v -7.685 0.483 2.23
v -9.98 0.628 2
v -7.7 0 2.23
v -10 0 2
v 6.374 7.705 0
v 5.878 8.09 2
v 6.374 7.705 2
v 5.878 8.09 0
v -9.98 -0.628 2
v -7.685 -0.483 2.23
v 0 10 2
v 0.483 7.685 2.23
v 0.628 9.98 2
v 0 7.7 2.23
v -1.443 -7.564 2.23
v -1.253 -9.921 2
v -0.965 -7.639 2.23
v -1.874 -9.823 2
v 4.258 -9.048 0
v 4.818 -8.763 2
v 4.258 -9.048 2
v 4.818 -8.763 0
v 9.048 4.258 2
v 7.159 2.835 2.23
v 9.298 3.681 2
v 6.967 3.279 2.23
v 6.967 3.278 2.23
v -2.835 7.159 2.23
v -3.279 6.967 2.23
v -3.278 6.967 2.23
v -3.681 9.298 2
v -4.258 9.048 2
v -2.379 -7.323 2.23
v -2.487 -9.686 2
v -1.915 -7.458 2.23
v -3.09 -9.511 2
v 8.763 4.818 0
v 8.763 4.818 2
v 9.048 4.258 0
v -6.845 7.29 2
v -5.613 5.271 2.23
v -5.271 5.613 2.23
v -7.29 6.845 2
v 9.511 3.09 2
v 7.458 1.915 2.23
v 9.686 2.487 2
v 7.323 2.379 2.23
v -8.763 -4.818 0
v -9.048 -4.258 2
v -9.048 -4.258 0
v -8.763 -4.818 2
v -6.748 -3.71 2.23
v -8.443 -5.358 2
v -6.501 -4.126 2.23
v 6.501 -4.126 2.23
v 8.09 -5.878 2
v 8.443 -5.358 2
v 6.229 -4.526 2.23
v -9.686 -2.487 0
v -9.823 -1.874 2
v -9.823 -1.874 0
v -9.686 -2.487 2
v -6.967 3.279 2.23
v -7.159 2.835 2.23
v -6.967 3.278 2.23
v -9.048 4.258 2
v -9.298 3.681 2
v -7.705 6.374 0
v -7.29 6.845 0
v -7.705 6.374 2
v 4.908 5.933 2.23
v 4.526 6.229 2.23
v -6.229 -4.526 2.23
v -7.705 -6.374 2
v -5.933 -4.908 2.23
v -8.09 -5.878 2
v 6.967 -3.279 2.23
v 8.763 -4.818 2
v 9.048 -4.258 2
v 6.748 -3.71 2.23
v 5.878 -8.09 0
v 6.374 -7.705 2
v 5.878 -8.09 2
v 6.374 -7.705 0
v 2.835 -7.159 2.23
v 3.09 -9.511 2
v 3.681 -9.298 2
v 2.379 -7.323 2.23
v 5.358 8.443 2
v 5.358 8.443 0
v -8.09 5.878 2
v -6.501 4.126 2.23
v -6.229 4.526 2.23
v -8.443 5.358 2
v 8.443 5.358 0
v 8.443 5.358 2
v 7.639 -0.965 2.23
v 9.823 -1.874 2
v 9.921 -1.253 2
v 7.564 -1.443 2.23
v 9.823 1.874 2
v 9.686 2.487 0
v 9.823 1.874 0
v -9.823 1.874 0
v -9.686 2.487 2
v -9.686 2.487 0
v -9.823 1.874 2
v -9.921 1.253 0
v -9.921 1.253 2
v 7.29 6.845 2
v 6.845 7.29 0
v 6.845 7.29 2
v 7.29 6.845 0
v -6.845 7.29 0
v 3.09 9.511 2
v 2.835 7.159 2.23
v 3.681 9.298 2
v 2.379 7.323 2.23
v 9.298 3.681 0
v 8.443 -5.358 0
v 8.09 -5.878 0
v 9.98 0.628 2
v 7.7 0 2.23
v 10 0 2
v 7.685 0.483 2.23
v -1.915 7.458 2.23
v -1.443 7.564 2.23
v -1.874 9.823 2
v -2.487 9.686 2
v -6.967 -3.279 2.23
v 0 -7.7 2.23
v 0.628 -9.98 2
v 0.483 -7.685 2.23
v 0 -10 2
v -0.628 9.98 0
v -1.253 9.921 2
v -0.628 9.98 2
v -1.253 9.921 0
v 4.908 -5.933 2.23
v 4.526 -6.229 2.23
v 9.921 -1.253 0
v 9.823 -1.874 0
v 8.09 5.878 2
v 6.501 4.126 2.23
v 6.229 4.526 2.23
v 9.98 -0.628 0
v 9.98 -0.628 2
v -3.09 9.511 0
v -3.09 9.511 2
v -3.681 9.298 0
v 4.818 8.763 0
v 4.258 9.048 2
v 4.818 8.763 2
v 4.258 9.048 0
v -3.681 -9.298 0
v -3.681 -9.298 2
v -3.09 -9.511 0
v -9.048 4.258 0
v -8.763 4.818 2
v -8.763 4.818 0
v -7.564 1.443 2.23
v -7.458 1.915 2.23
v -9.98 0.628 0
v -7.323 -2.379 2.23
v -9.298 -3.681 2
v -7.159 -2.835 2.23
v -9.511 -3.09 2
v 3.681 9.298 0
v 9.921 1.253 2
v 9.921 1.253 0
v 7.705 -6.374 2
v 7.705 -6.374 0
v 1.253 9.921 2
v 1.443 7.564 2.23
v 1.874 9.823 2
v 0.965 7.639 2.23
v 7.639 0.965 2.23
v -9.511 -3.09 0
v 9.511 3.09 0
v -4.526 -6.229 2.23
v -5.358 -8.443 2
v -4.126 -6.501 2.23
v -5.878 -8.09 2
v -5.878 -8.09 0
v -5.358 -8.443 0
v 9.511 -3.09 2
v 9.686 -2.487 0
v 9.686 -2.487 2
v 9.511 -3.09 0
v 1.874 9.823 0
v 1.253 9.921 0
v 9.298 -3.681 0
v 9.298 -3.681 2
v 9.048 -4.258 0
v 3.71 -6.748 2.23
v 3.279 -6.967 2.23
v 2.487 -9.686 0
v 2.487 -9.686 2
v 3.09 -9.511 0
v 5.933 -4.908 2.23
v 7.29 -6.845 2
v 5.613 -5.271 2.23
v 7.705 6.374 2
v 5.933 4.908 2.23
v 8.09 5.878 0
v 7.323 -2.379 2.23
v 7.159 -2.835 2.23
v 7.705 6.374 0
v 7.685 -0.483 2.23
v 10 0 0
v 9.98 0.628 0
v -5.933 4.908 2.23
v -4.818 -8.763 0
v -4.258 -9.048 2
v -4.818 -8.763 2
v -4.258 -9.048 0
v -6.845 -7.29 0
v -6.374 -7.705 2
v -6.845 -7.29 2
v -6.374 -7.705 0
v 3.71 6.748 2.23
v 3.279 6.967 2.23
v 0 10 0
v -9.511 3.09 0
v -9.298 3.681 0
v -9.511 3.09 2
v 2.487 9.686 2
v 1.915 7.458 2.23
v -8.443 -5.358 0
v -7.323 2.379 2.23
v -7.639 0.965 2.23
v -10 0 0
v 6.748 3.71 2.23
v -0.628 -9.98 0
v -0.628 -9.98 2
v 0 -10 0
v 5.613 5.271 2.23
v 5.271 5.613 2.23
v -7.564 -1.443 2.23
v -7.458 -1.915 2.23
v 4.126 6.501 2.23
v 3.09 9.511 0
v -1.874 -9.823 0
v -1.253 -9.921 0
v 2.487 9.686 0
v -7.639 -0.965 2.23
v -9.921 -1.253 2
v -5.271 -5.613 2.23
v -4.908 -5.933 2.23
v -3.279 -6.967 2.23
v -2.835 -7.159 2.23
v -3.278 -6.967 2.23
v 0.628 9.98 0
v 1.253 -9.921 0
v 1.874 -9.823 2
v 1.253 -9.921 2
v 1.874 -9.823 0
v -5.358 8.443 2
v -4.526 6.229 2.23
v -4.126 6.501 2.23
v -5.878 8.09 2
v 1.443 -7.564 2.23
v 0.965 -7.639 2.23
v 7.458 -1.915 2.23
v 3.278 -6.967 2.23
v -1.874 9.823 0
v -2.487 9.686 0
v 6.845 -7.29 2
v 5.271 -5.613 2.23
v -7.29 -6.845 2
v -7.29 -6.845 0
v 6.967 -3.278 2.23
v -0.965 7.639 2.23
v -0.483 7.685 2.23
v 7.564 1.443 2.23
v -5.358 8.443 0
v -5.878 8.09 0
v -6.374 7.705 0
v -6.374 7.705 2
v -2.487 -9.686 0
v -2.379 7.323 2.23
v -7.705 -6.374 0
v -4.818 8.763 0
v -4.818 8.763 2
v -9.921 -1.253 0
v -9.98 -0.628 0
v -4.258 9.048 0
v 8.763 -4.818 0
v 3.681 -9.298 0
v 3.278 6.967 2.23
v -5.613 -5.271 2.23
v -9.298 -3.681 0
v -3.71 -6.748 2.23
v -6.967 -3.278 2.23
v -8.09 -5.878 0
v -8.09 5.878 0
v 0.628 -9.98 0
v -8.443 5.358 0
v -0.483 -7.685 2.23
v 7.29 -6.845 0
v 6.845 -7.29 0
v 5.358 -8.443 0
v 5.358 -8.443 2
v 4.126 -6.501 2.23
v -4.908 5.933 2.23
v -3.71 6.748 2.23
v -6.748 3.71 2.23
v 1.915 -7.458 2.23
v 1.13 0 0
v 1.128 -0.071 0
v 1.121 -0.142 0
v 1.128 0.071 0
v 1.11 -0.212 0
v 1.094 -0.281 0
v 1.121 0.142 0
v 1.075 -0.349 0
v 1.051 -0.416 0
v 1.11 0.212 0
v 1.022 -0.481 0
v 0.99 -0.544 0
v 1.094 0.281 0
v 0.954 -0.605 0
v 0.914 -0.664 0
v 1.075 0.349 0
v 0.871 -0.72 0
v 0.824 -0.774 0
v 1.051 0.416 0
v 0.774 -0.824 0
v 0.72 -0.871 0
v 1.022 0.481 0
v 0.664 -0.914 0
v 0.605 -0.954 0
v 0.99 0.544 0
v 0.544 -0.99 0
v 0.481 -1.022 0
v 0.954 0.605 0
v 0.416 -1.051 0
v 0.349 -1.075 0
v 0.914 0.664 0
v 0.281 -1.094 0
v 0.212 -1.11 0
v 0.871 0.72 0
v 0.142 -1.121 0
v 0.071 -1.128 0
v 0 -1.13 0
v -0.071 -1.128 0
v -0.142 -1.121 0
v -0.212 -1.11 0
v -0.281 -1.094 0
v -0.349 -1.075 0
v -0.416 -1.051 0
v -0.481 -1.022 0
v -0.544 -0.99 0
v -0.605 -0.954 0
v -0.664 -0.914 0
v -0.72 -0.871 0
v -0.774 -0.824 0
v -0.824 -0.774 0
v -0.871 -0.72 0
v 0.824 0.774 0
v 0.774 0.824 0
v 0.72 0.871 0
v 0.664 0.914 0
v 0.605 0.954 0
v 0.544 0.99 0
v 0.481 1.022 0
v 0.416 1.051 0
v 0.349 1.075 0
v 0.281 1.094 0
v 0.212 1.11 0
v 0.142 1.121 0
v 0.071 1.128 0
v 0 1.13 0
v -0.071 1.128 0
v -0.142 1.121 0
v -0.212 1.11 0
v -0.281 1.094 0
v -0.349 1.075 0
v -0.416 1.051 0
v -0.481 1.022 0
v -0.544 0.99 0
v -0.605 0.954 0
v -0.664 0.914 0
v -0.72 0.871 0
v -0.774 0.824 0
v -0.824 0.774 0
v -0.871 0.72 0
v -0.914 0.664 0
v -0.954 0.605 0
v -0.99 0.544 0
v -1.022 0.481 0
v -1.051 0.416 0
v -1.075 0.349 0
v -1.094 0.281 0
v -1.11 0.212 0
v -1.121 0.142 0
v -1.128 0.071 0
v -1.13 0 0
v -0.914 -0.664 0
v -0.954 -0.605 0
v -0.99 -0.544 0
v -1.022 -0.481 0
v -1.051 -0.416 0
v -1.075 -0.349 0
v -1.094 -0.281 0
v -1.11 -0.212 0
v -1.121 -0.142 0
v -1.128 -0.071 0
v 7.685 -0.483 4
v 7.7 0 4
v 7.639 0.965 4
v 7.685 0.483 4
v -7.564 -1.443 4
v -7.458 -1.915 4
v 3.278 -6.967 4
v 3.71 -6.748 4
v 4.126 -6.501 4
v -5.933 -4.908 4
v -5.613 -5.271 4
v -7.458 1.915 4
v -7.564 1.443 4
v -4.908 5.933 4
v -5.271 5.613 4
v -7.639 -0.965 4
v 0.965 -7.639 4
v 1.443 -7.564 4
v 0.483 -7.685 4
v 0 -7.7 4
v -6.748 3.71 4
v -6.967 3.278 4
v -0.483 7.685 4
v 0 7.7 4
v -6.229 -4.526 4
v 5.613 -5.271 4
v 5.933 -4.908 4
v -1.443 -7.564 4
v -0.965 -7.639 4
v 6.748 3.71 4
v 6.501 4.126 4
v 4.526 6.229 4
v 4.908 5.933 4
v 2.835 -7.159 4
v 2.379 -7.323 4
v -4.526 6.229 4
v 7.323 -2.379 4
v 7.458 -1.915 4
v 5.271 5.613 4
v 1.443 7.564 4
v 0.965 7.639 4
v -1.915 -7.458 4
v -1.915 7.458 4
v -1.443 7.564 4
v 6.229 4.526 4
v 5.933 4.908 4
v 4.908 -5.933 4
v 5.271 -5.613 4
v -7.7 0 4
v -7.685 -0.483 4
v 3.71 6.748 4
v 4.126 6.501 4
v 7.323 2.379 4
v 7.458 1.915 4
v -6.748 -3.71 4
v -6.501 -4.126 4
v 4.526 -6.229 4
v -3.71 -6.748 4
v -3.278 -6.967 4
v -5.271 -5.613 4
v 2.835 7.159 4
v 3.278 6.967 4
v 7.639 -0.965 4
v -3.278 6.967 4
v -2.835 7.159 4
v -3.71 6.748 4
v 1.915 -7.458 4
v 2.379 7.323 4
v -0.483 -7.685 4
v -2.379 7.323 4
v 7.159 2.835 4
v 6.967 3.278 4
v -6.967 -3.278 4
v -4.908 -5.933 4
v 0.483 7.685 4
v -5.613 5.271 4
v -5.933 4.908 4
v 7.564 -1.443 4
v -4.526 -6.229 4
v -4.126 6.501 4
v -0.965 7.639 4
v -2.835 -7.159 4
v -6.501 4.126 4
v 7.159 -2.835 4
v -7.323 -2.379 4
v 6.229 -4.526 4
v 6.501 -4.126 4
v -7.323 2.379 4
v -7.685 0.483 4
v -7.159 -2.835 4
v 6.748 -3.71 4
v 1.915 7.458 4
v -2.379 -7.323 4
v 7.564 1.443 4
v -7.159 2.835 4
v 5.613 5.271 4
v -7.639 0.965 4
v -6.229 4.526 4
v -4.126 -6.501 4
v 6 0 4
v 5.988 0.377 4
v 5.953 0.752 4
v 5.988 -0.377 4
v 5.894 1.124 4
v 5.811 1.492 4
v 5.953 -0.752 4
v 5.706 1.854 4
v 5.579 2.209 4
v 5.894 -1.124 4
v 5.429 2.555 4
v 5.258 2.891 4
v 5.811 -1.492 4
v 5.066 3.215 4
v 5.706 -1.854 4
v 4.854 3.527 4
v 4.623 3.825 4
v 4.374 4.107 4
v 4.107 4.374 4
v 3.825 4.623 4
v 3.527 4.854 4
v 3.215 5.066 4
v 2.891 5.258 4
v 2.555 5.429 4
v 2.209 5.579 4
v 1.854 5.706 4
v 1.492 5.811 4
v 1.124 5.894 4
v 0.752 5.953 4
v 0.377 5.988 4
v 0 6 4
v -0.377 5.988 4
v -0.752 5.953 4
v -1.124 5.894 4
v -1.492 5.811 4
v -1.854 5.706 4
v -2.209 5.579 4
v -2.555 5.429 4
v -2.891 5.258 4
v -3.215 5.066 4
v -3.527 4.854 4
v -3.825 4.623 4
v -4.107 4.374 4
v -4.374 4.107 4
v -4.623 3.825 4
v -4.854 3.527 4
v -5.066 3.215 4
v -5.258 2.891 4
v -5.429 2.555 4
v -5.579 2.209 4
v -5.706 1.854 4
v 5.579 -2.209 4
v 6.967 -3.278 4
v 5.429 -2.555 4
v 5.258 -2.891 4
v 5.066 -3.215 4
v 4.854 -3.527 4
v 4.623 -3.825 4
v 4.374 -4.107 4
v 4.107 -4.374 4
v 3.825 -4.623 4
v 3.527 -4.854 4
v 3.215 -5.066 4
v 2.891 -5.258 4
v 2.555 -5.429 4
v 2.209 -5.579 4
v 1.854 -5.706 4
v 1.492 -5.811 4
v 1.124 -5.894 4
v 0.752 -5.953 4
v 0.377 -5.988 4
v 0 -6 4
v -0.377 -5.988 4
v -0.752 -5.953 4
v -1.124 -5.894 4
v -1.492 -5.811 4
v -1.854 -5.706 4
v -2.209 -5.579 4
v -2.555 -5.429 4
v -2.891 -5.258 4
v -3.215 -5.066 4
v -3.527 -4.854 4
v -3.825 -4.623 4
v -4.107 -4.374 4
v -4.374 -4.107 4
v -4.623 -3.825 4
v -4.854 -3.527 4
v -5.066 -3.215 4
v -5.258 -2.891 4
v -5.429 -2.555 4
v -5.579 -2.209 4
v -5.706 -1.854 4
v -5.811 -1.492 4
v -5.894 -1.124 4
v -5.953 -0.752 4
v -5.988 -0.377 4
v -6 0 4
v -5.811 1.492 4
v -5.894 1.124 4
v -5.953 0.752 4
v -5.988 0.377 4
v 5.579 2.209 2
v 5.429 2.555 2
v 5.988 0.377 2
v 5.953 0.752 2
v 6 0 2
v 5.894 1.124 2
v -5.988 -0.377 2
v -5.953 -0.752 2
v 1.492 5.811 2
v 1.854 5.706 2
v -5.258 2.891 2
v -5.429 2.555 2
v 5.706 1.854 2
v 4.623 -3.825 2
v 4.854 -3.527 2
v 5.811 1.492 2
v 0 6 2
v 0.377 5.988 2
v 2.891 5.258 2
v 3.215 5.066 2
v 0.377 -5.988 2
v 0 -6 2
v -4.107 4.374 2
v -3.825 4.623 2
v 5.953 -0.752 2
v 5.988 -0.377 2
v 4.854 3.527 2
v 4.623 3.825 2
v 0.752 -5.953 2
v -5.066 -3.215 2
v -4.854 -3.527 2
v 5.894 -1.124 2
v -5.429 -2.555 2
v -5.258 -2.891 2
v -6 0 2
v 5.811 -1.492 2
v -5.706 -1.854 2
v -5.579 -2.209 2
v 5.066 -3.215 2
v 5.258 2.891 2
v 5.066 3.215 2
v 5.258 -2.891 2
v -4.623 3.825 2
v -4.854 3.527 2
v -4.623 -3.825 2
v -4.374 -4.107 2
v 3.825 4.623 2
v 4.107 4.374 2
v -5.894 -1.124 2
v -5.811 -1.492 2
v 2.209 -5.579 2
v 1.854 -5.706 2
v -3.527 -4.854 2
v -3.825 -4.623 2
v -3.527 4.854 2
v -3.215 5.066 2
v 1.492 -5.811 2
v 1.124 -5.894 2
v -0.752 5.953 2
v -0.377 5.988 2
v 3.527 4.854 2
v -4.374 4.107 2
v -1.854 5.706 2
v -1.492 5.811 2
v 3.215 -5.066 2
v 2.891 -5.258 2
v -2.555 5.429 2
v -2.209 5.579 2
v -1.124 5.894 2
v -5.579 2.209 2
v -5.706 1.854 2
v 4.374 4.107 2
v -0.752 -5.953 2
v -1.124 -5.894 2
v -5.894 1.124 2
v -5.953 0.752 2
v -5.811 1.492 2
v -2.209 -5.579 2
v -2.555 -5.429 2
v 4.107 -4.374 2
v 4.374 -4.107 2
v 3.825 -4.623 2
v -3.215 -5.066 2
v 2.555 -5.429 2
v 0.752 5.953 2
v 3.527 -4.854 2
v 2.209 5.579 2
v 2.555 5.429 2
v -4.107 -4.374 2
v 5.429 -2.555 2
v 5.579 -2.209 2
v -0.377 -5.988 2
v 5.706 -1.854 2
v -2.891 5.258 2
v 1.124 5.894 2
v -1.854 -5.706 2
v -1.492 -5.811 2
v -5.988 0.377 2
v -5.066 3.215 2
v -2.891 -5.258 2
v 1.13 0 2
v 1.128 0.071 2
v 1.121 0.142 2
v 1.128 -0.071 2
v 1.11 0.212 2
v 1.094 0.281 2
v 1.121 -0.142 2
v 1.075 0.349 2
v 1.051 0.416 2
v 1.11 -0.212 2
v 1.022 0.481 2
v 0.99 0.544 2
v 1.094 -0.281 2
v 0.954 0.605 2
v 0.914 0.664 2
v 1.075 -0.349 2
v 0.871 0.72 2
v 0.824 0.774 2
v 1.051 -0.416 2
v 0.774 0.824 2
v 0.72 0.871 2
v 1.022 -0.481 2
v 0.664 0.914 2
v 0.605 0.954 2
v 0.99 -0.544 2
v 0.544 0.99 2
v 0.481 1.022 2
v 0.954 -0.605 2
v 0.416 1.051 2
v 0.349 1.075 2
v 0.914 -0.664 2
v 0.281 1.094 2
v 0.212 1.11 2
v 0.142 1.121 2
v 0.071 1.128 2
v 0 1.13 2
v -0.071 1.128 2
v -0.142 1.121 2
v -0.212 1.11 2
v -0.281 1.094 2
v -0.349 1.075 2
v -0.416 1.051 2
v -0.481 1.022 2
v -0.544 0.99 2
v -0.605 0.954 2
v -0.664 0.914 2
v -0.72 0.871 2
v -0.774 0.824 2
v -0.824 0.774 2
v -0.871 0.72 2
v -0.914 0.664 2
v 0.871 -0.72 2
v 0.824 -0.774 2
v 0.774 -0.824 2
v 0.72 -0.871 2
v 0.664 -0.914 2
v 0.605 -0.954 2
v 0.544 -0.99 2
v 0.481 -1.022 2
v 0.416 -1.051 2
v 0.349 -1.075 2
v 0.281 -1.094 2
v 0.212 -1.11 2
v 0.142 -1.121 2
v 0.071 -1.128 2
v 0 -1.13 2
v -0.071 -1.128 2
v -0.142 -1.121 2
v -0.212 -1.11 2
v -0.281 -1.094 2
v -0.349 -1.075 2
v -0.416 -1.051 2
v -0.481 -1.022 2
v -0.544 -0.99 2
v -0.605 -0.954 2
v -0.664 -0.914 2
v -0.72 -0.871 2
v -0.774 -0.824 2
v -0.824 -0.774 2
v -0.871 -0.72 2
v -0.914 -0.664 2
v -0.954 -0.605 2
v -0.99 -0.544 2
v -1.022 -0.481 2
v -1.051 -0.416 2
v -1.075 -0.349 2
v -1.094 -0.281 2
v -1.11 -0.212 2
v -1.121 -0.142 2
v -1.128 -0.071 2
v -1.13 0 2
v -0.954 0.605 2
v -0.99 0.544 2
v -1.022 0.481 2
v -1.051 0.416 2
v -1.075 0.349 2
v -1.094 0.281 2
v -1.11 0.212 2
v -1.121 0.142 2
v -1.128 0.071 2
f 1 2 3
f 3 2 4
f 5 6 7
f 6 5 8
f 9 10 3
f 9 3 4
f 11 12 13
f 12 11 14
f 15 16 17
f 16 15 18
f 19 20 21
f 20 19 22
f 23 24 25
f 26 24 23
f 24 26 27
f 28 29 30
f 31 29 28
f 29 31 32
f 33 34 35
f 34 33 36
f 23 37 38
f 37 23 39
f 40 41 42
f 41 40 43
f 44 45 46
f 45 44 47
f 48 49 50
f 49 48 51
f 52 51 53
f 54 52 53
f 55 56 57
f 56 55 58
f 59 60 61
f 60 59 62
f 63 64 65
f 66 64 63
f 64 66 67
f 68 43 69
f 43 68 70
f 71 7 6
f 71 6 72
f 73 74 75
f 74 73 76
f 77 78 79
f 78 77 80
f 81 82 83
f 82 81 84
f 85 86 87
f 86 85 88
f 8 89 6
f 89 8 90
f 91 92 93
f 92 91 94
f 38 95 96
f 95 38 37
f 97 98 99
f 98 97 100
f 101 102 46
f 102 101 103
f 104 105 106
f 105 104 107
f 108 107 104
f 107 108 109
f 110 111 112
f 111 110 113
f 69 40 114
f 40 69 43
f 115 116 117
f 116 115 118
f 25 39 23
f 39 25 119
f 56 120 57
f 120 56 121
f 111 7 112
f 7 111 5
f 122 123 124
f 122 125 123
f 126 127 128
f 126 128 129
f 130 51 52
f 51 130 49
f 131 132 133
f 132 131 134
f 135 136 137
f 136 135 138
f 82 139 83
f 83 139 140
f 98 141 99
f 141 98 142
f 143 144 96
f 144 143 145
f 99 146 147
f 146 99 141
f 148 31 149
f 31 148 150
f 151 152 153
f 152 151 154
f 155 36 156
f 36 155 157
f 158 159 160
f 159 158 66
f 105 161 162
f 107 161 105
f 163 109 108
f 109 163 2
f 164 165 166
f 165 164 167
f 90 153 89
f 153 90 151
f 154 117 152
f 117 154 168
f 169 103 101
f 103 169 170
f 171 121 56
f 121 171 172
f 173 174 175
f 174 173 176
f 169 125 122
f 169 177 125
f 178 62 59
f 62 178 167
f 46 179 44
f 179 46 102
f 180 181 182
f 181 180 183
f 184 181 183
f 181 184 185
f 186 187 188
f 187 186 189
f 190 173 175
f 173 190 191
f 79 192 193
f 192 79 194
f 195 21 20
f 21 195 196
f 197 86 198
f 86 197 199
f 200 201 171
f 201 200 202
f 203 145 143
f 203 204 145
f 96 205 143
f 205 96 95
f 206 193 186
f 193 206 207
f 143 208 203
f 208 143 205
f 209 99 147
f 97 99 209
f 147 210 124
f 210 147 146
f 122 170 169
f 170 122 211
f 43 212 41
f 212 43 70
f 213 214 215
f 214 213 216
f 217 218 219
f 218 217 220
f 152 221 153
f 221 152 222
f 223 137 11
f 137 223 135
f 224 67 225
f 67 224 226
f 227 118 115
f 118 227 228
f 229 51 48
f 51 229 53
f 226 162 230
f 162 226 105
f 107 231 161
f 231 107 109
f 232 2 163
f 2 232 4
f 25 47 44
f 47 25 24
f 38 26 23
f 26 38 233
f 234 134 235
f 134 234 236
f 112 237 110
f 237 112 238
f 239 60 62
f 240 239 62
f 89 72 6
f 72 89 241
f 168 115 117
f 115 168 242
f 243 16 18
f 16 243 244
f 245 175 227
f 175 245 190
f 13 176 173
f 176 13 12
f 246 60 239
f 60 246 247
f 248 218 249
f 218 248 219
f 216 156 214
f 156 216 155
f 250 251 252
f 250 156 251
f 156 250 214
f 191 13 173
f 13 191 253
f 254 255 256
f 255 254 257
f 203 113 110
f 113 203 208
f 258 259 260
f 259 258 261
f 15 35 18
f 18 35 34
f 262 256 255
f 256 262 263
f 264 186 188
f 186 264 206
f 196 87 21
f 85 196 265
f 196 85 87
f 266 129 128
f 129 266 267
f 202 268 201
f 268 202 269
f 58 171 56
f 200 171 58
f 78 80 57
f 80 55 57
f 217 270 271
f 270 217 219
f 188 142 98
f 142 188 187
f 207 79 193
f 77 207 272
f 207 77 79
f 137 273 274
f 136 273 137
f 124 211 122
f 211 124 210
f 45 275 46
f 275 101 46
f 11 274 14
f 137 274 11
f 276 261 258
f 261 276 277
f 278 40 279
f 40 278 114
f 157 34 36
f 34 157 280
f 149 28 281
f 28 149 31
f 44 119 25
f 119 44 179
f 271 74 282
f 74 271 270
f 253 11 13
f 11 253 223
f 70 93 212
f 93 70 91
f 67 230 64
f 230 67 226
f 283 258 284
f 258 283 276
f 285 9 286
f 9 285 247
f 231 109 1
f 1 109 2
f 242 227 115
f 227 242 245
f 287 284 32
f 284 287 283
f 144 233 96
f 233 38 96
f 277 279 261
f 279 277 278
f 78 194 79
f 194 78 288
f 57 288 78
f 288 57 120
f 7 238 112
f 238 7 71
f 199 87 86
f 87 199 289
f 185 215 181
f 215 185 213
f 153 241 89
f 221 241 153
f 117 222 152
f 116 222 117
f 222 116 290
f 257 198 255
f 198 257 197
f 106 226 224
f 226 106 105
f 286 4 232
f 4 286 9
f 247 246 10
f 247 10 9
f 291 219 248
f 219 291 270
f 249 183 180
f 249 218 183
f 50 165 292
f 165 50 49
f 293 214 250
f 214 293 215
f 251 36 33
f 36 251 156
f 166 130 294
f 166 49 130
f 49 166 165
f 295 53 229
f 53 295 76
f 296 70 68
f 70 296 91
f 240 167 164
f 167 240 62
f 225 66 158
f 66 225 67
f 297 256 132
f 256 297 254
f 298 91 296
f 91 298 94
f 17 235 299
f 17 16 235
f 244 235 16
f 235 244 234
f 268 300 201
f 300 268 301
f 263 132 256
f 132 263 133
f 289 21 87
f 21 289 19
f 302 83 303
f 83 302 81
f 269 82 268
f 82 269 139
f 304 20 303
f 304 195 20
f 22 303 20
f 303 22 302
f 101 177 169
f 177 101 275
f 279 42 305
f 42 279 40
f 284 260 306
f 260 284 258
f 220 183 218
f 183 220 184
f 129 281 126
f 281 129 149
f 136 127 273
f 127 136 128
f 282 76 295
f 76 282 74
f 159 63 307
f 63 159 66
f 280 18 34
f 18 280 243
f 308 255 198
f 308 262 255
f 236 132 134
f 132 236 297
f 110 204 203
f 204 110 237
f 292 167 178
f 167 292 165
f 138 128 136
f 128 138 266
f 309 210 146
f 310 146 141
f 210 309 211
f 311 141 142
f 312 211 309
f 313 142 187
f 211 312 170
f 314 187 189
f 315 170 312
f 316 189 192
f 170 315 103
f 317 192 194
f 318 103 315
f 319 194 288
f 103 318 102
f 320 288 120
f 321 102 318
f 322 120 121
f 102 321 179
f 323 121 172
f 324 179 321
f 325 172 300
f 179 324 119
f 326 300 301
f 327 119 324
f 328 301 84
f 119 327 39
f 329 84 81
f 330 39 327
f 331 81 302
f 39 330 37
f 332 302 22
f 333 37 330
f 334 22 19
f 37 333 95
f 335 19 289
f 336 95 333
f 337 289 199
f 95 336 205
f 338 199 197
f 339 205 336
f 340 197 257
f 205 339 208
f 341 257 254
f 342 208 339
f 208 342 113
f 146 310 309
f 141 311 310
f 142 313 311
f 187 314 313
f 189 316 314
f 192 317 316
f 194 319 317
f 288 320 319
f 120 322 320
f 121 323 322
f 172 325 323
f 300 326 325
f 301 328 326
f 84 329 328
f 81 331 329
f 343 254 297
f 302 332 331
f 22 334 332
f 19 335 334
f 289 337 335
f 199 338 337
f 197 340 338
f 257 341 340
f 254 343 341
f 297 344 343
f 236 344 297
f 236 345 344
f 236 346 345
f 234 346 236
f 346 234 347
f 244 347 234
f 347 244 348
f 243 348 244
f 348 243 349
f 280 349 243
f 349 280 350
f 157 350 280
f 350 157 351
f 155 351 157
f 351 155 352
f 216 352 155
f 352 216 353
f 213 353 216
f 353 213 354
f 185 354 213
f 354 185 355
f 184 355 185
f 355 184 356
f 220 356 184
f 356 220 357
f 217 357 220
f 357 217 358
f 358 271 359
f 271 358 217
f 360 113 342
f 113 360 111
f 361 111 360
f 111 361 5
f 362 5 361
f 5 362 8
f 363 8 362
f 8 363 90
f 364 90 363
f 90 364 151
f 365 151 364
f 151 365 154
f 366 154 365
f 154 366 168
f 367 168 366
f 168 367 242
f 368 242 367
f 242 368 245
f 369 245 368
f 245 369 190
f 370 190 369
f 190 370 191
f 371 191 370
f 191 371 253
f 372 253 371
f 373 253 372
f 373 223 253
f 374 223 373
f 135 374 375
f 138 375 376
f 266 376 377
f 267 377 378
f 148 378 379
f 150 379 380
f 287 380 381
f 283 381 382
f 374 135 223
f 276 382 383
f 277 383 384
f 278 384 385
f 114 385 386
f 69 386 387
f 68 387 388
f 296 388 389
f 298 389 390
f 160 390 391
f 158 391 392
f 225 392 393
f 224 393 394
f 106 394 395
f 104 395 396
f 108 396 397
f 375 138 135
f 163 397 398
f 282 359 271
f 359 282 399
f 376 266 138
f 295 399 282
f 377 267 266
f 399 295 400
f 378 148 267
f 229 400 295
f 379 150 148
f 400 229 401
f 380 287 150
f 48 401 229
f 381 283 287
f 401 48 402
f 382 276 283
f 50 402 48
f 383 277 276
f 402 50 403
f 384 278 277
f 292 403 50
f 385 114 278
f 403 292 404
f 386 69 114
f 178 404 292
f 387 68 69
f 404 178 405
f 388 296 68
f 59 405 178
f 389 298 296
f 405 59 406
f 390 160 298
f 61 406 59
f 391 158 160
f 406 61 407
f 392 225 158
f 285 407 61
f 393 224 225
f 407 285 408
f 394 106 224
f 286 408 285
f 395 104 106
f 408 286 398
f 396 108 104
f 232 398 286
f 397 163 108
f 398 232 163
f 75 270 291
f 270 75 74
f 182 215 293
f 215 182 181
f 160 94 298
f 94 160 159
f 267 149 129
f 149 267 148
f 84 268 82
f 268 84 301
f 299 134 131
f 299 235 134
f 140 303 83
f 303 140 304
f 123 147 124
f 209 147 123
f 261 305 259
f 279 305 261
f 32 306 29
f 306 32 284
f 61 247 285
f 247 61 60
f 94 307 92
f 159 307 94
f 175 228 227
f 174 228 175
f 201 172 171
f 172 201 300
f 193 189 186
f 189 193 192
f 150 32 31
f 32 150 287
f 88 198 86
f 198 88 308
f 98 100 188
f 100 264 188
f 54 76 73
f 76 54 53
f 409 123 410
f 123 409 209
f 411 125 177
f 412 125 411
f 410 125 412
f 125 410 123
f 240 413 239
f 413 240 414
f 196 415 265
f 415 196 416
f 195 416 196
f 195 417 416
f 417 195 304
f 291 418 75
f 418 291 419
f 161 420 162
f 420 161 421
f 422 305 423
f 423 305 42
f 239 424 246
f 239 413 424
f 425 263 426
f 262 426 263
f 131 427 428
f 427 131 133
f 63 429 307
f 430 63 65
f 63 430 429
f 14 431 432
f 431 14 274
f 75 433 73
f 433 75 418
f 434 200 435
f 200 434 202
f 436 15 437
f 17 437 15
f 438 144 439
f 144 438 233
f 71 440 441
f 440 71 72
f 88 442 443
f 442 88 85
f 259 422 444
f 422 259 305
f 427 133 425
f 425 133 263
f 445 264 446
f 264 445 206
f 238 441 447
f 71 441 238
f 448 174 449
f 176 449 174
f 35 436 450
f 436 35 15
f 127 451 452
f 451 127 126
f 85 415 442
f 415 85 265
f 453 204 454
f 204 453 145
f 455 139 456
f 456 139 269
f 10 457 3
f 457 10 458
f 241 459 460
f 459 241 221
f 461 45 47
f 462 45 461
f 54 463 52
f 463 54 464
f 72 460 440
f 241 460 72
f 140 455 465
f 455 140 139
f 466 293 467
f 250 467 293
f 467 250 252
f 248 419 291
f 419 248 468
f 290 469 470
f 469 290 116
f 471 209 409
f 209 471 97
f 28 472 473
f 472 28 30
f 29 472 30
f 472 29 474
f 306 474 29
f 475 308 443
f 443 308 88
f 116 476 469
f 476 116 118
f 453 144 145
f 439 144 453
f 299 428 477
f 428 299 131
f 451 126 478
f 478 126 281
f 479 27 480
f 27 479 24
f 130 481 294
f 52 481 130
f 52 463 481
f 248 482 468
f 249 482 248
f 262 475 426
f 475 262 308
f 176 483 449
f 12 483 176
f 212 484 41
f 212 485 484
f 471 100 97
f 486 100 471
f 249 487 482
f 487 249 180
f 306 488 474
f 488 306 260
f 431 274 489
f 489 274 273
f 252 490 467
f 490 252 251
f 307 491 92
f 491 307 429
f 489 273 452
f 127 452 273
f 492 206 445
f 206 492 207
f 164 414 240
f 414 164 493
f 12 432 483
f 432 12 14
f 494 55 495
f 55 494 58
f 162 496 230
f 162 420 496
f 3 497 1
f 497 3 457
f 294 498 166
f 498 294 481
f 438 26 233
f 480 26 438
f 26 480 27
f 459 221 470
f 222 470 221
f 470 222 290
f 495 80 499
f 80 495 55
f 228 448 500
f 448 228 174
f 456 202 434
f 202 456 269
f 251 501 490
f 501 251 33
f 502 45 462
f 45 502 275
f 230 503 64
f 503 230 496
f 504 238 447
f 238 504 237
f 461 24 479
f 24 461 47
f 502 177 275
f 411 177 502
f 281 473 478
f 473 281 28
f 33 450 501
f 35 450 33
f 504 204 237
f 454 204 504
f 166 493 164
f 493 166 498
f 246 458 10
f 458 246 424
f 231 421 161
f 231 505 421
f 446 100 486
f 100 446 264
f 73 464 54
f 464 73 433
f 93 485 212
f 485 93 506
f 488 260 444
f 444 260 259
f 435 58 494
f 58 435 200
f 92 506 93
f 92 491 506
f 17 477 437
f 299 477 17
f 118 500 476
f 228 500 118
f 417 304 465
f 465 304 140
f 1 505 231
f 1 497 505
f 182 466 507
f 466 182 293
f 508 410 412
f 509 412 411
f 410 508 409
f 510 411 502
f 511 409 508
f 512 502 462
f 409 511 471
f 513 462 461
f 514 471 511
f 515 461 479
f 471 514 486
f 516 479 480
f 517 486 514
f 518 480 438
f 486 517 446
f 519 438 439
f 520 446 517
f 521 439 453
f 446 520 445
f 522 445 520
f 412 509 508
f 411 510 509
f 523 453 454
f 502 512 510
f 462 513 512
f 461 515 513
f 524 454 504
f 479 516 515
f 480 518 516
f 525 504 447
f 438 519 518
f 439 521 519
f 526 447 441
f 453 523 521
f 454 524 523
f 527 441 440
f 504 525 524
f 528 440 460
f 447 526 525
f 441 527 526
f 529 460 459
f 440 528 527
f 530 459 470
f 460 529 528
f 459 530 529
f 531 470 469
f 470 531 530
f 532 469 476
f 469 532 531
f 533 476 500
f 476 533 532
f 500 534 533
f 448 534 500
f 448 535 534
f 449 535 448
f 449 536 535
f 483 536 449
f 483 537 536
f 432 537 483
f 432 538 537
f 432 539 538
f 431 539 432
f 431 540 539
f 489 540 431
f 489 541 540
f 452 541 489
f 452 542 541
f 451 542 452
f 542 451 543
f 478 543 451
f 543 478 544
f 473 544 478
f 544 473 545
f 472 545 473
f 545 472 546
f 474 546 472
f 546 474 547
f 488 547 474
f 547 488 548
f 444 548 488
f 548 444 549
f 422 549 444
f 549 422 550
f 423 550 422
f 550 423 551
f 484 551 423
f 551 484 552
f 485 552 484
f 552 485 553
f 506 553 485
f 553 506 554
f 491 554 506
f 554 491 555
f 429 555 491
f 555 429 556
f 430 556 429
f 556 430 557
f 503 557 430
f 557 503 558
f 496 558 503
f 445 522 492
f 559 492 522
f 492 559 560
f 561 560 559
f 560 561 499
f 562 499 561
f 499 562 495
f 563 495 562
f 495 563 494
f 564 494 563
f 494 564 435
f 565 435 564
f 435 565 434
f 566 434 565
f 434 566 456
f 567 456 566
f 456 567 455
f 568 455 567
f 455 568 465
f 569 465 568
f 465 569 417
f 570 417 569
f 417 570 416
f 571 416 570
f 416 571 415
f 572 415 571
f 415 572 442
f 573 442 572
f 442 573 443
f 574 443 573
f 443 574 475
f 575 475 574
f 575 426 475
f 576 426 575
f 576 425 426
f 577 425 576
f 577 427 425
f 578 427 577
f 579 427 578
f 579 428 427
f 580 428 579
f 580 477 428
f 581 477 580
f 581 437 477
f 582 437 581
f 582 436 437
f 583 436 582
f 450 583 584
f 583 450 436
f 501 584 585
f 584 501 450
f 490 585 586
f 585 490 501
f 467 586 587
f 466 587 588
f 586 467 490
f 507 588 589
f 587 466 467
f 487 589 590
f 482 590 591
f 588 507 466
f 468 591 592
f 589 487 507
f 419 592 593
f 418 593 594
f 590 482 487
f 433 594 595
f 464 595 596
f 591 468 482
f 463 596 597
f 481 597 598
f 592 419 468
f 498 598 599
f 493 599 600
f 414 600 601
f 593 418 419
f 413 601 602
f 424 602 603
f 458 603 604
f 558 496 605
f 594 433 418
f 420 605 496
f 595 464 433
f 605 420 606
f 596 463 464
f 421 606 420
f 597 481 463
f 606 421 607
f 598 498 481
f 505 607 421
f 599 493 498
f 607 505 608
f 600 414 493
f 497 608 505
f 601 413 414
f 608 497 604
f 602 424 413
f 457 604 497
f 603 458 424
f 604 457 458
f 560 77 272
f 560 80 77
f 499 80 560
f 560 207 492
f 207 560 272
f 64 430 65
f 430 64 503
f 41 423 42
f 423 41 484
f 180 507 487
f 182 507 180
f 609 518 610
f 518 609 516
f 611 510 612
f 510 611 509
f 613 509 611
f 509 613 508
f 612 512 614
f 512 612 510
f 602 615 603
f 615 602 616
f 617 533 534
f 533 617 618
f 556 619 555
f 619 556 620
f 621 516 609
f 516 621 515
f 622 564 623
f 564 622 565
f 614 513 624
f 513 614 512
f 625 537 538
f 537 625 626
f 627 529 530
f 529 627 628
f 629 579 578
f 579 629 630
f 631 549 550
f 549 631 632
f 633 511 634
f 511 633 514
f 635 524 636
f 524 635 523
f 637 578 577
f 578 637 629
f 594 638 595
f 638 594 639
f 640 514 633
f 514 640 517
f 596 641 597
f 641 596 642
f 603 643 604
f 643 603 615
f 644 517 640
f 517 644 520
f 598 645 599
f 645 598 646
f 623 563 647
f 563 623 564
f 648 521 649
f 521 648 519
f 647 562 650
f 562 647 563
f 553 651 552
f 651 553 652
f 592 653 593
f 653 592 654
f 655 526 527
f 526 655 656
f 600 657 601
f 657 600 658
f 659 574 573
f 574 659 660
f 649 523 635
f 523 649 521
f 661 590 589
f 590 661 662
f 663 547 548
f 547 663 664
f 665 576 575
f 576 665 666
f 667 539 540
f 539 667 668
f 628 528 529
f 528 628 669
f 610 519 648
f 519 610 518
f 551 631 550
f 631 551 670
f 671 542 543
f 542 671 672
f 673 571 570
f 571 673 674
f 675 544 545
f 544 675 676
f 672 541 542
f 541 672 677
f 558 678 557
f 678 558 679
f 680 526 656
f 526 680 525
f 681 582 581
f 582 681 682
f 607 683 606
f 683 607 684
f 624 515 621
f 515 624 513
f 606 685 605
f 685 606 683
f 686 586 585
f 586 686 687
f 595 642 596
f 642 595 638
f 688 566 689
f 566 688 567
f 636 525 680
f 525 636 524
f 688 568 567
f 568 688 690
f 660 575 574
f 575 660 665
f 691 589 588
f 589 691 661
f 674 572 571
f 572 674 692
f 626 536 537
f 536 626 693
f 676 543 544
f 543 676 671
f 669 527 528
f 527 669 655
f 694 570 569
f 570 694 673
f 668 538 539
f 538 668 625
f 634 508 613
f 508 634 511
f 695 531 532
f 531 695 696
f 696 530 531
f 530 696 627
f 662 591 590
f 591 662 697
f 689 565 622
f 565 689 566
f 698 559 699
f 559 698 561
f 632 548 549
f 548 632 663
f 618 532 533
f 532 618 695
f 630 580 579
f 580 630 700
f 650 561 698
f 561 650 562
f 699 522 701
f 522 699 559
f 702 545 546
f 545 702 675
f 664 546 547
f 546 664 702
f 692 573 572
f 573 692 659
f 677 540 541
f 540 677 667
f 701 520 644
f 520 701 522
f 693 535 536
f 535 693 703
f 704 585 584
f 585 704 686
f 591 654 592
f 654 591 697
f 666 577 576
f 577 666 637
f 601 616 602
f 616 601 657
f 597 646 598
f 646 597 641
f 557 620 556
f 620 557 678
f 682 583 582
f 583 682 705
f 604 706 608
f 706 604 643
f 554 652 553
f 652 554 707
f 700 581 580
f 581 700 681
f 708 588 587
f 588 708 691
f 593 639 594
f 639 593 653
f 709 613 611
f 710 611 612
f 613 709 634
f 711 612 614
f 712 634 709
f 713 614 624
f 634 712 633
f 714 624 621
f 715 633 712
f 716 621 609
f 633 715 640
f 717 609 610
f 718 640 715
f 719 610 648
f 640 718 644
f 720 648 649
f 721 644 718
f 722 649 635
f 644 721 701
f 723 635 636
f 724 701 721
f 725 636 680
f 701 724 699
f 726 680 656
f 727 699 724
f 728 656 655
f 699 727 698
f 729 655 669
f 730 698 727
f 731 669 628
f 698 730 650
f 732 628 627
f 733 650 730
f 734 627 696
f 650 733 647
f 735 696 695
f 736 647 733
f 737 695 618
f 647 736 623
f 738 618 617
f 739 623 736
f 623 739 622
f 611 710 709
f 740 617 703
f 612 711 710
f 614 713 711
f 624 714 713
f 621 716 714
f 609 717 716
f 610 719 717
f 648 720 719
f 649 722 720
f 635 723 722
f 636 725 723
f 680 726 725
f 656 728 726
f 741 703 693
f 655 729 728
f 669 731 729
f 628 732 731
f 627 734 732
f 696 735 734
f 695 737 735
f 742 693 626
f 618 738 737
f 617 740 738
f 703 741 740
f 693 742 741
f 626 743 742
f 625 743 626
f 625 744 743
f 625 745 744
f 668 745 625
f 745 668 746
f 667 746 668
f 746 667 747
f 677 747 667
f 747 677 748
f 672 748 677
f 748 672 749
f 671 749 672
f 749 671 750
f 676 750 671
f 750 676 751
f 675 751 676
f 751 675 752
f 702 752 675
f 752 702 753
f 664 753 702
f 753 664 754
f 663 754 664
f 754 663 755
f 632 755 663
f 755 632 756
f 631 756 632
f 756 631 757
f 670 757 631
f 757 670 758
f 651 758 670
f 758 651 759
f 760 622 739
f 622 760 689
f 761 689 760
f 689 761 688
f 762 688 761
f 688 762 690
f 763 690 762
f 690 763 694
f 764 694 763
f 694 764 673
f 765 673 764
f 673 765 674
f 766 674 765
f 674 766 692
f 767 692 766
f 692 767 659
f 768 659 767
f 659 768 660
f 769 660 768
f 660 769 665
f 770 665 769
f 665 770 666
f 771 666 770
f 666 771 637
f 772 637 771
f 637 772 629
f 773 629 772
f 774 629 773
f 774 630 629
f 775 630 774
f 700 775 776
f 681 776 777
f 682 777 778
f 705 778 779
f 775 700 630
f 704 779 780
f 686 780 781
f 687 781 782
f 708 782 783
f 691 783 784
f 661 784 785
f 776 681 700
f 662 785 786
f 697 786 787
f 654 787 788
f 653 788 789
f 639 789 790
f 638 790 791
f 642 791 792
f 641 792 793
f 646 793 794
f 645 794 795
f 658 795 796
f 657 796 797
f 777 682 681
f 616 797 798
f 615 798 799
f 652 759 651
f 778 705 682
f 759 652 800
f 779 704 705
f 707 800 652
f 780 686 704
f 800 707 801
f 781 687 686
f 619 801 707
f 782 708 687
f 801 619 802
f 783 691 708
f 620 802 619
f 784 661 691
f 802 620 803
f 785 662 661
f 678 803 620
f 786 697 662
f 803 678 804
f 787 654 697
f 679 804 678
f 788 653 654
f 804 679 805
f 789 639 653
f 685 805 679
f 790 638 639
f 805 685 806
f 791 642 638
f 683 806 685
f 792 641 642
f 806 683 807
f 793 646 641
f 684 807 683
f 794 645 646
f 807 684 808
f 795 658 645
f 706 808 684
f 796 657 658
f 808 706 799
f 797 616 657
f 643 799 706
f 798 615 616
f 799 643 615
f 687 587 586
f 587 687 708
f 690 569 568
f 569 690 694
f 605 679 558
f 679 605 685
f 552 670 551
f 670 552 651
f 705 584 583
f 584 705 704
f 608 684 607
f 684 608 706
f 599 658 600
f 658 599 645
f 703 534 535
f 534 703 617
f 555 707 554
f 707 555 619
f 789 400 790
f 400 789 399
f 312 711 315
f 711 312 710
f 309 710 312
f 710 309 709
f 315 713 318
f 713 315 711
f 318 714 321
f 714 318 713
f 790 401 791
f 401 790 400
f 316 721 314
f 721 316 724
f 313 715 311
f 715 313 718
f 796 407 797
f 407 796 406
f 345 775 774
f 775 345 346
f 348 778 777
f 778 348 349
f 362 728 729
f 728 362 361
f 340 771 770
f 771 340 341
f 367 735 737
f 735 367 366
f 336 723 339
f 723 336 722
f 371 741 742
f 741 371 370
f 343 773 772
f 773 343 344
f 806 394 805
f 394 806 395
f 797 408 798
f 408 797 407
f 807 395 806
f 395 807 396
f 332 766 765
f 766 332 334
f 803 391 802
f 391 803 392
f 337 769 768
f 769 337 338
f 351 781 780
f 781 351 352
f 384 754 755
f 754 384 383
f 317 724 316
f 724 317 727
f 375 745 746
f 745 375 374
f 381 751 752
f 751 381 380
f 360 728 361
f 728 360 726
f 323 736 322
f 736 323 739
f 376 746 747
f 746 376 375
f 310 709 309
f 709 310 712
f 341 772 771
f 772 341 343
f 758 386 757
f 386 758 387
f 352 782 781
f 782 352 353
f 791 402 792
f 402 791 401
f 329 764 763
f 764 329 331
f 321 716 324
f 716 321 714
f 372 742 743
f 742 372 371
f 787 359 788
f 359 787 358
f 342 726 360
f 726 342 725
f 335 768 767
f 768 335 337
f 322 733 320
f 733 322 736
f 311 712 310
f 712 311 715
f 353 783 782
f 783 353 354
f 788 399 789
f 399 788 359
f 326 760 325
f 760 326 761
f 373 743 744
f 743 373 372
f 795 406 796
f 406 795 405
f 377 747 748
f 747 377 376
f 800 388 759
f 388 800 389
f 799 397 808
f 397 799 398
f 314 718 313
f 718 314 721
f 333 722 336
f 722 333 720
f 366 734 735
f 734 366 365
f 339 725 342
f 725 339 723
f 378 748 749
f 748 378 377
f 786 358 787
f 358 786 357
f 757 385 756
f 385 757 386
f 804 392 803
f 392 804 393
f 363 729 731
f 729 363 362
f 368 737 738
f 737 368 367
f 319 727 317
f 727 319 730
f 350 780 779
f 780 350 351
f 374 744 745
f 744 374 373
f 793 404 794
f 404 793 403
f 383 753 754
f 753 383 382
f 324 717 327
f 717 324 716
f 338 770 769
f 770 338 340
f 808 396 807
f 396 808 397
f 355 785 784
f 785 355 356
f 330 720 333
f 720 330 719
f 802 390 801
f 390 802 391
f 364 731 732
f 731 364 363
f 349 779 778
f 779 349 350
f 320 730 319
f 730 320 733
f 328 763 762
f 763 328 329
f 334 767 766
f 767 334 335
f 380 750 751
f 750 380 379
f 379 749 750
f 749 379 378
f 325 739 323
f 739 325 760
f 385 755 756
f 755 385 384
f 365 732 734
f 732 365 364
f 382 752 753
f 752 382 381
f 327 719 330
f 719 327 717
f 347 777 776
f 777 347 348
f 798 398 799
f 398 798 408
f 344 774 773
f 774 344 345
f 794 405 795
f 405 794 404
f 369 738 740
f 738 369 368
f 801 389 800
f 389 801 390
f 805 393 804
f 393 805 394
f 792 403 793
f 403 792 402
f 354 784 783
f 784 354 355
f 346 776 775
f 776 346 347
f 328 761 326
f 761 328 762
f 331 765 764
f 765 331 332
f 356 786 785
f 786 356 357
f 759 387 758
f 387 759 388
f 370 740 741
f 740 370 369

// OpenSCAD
// Global resolution for round edges
fn=100;

// See instructions here:
// https://sites.google.com/site/handmadewoodentrains/home/articles

// Diameters:
//   Thomas: 19.4
//   Thomas Early Engineers: 24
//   Imaginarium: 20
//   BigJigs: 21.8
//   Brio: 20.4
radius=10;

// Wheel Thickness:
// Note: Most wheels have a slight slant to them (.5mm or so), and were measured from the thicker end of the slant)
//   Thomas: 2.5 collar,  3 - 4 - 7
//   Thomas Early Engineers: 1.8 collar, 3.7 - 4.2 - 7.7
//   Imaginarium: 2.8 - 5
//   BigJigs: 3.2 - 6
//   Brio: 3 - 5
thickness = 3;
bevel = 1;
hub_thickness = 4;

// Note: axel width
// Thomas (all): 15mm (which is why the wheels need collars)
// Everyone else: 20mm

// Hub Radius
// Based on a variety of Hillman's furniture tacks 10.7-11.8mm diameter, plus some wiggle
hub_radius = 6;

// Hub Collar
// This thickness of the wall that is hub_thickness thick
// measurement of 1.7mm is standard across non-Thomas wheels (Thomas wheels don't have a hub cap)
hub_collar = 1.7;

// Axel radius is based on 3/32" tubing size measuring 2.25mm outside diameter, with a little wiggle room
axel_radius = 1.13;

module wheel() {
	difference() {
		union() {
			rotate_extrude(height = 10, center = true, convexity = 10, twist = 0, $fn=fn)
				polygon(points=[[0,0],[radius,0],[radius,thickness-bevel],[0,thickness]], paths=[[0,1,2,3,0]]);
			cylinder(h = hub_thickness, r = hub_radius+hub_collar, center = false, $fn=fn);
		}
		union() {
			translate([0,0,thickness-bevel])
				cylinder(h = hub_thickness, r = hub_radius, center = false, $fn=fn);
			translate([0,0,-.1])
				cylinder(h = hub_thickness + .1, r = axel_radius, $fn=fn);
		}
	}
}


wheel();
